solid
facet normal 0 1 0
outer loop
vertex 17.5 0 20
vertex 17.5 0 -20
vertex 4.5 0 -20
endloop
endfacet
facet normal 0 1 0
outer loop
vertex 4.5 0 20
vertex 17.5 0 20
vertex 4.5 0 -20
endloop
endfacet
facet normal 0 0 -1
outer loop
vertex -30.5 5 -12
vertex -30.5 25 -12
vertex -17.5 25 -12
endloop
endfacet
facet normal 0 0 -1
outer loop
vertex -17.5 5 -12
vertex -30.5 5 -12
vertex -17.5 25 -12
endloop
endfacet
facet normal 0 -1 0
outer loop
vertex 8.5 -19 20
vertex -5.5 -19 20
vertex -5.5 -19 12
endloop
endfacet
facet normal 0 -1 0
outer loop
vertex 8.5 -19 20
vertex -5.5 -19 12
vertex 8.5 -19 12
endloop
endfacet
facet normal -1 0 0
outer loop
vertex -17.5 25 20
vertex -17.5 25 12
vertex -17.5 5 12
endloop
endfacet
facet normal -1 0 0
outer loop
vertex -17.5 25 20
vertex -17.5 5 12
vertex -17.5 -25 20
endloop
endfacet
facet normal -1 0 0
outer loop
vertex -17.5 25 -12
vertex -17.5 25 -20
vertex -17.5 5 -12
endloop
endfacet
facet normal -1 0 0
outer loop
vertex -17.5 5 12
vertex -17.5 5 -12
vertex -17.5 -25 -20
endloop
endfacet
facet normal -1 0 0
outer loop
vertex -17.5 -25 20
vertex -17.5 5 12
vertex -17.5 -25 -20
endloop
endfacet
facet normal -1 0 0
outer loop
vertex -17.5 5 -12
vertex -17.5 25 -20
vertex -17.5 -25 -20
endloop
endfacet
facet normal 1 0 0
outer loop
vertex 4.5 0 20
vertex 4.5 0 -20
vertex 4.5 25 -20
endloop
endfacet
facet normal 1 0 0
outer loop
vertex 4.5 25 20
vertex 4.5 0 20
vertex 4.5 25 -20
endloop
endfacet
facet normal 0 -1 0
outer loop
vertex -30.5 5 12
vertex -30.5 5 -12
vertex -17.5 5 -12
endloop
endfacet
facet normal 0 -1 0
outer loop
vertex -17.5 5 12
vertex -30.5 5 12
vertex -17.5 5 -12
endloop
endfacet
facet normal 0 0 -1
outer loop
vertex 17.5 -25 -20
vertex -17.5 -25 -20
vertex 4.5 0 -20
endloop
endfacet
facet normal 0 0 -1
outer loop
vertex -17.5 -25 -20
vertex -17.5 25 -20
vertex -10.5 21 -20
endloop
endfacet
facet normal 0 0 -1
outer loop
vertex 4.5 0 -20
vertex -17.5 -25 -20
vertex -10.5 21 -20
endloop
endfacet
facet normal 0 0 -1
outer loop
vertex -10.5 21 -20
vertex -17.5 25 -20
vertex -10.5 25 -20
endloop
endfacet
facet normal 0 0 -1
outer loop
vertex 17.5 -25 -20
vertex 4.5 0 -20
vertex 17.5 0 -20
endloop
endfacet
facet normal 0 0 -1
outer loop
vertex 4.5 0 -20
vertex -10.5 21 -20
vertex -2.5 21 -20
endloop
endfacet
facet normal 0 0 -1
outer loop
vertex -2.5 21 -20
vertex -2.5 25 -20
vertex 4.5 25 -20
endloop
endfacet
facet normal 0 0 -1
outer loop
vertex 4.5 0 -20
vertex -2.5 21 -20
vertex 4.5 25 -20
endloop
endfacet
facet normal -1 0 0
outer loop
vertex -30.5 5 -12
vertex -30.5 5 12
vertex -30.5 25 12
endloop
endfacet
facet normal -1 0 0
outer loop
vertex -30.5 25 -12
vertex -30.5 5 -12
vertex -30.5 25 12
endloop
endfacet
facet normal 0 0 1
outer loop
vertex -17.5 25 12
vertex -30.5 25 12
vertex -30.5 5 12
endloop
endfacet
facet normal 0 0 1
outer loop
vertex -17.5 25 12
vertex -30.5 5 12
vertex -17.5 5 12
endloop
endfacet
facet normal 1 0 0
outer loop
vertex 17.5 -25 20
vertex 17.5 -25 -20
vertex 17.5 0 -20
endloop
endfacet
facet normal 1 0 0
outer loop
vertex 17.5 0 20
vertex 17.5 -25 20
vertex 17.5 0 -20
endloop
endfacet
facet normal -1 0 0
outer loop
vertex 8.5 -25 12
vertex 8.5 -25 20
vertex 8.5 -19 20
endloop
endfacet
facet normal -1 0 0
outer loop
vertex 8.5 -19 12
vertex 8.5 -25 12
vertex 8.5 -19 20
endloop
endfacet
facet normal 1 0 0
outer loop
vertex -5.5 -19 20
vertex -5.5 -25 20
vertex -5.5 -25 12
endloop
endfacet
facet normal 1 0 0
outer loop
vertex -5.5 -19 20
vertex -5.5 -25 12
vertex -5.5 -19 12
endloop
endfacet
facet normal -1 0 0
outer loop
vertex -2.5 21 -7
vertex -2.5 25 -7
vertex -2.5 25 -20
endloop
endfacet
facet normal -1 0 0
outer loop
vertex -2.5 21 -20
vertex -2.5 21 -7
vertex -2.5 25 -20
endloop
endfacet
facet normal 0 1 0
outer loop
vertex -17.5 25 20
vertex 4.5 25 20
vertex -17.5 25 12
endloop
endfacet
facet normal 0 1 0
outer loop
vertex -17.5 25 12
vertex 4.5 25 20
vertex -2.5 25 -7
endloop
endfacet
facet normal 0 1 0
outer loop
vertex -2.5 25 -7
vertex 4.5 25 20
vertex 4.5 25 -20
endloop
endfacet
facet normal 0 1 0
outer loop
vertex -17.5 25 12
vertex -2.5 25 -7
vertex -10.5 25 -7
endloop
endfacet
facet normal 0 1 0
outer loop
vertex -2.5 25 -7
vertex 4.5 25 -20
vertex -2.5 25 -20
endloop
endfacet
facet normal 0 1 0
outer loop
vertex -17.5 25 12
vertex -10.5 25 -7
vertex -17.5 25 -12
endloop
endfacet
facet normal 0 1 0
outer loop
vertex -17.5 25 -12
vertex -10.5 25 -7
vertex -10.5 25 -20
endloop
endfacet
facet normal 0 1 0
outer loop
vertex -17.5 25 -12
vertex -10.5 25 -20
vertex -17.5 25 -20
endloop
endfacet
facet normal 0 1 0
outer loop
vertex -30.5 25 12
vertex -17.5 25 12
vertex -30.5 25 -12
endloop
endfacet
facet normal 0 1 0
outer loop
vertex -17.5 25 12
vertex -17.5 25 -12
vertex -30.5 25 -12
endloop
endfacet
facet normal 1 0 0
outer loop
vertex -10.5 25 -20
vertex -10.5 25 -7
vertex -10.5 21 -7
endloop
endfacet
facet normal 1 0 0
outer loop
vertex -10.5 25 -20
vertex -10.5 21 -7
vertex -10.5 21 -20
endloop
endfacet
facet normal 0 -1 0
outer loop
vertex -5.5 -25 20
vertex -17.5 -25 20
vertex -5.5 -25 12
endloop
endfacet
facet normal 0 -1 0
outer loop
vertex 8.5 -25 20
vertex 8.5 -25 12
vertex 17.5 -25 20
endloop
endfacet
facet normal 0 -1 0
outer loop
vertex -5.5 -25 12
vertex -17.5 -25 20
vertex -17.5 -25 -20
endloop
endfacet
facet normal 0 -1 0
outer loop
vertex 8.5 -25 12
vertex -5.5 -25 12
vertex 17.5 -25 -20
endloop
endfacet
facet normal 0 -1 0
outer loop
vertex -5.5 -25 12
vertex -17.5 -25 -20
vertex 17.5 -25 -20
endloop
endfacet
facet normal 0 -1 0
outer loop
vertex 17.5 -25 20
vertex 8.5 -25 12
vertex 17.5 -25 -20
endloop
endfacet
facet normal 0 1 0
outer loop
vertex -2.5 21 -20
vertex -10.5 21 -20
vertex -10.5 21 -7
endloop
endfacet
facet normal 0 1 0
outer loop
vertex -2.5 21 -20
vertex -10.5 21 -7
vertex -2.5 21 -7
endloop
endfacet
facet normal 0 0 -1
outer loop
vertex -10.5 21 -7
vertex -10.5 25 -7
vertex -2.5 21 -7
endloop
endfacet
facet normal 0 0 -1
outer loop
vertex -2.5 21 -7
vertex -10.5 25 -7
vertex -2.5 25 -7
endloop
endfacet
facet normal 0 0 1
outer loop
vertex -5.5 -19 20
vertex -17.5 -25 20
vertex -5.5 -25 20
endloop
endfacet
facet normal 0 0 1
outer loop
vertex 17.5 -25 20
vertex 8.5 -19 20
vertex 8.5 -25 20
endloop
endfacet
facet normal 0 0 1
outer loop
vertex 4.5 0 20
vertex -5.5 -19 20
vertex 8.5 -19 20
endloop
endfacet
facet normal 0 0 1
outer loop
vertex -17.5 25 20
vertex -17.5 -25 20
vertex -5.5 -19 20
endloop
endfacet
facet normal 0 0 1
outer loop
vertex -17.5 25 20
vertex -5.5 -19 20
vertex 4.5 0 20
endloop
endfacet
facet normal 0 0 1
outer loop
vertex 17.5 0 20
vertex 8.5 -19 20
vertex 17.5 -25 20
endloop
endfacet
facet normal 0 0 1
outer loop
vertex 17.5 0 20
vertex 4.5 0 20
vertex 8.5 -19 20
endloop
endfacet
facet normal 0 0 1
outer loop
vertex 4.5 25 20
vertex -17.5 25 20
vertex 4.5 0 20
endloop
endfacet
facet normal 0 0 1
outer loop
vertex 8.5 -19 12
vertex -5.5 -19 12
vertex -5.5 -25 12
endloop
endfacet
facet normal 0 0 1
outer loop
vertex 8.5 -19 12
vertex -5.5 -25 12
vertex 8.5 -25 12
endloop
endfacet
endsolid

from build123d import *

# Parameters (mm, degrees)
EXTRUDE_1_DEPTH      = 20
EXTRUDE_1_DEPTH_BACK = 20
EXTRUDE_2_DEPTH      = 12
EXTRUDE_2_DEPTH_BACK = 12
SKETCH_1_3_W         = 13
SKETCH_1_3_H         = 20
SKETCH_2_W           = 14
SKETCH_2_H           = 6
CUT_EXTRUDE_1_DEPTH  = 8
SKETCH_3_W           = 8
SKETCH_3_H           = 13
CUT_EXTRUDE_2_DEPTH  = 4


with BuildPart() as part:
    # Эскиз1 → Бобышка-Вытянуть1 (new, two sides: drawn at the far end of the back side and taken through both)
    with BuildSketch(Plane.XY.offset(-EXTRUDE_1_DEPTH_BACK)):
        Polygon((-17.5, 5), (-17.5, -25), (17.5, -25), (17.5, 0), (4.5, 0), (4.5, 25), (-17.5, 25), align=None)
    extrude(amount=EXTRUDE_1_DEPTH + EXTRUDE_1_DEPTH_BACK)

    # Эскиз1<3> → Бобышка-Вытянуть2 (add, two sides: drawn at the far end of the back side and taken through both)
    with BuildSketch(Plane.XY.offset(-EXTRUDE_2_DEPTH_BACK)):
        with Locations((-24, 15)):
            Rectangle(SKETCH_1_3_W, SKETCH_1_3_H)
    extrude(amount=EXTRUDE_2_DEPTH + EXTRUDE_2_DEPTH_BACK)

    # Эскиз2 → Вырез-Вытянуть1 (cut)
    with BuildSketch(Plane.XY.offset(20)):
        with Locations((1.5, -22)):
            Rectangle(SKETCH_2_W, SKETCH_2_H)
    extrude(amount=-CUT_EXTRUDE_1_DEPTH, mode=Mode.SUBTRACT)

    # Эскиз3 → Вырез-Вытянуть2 (cut)
    with BuildSketch(Plane(origin=(0, 25, 0), x_dir=(1, 0, 0), z_dir=(0, 1, 0))):
        with Locations((-6.5, 13.5)):
            Rectangle(SKETCH_3_W, SKETCH_3_H)
    extrude(amount=-CUT_EXTRUDE_2_DEPTH, mode=Mode.SUBTRACT)


solid = part.part
